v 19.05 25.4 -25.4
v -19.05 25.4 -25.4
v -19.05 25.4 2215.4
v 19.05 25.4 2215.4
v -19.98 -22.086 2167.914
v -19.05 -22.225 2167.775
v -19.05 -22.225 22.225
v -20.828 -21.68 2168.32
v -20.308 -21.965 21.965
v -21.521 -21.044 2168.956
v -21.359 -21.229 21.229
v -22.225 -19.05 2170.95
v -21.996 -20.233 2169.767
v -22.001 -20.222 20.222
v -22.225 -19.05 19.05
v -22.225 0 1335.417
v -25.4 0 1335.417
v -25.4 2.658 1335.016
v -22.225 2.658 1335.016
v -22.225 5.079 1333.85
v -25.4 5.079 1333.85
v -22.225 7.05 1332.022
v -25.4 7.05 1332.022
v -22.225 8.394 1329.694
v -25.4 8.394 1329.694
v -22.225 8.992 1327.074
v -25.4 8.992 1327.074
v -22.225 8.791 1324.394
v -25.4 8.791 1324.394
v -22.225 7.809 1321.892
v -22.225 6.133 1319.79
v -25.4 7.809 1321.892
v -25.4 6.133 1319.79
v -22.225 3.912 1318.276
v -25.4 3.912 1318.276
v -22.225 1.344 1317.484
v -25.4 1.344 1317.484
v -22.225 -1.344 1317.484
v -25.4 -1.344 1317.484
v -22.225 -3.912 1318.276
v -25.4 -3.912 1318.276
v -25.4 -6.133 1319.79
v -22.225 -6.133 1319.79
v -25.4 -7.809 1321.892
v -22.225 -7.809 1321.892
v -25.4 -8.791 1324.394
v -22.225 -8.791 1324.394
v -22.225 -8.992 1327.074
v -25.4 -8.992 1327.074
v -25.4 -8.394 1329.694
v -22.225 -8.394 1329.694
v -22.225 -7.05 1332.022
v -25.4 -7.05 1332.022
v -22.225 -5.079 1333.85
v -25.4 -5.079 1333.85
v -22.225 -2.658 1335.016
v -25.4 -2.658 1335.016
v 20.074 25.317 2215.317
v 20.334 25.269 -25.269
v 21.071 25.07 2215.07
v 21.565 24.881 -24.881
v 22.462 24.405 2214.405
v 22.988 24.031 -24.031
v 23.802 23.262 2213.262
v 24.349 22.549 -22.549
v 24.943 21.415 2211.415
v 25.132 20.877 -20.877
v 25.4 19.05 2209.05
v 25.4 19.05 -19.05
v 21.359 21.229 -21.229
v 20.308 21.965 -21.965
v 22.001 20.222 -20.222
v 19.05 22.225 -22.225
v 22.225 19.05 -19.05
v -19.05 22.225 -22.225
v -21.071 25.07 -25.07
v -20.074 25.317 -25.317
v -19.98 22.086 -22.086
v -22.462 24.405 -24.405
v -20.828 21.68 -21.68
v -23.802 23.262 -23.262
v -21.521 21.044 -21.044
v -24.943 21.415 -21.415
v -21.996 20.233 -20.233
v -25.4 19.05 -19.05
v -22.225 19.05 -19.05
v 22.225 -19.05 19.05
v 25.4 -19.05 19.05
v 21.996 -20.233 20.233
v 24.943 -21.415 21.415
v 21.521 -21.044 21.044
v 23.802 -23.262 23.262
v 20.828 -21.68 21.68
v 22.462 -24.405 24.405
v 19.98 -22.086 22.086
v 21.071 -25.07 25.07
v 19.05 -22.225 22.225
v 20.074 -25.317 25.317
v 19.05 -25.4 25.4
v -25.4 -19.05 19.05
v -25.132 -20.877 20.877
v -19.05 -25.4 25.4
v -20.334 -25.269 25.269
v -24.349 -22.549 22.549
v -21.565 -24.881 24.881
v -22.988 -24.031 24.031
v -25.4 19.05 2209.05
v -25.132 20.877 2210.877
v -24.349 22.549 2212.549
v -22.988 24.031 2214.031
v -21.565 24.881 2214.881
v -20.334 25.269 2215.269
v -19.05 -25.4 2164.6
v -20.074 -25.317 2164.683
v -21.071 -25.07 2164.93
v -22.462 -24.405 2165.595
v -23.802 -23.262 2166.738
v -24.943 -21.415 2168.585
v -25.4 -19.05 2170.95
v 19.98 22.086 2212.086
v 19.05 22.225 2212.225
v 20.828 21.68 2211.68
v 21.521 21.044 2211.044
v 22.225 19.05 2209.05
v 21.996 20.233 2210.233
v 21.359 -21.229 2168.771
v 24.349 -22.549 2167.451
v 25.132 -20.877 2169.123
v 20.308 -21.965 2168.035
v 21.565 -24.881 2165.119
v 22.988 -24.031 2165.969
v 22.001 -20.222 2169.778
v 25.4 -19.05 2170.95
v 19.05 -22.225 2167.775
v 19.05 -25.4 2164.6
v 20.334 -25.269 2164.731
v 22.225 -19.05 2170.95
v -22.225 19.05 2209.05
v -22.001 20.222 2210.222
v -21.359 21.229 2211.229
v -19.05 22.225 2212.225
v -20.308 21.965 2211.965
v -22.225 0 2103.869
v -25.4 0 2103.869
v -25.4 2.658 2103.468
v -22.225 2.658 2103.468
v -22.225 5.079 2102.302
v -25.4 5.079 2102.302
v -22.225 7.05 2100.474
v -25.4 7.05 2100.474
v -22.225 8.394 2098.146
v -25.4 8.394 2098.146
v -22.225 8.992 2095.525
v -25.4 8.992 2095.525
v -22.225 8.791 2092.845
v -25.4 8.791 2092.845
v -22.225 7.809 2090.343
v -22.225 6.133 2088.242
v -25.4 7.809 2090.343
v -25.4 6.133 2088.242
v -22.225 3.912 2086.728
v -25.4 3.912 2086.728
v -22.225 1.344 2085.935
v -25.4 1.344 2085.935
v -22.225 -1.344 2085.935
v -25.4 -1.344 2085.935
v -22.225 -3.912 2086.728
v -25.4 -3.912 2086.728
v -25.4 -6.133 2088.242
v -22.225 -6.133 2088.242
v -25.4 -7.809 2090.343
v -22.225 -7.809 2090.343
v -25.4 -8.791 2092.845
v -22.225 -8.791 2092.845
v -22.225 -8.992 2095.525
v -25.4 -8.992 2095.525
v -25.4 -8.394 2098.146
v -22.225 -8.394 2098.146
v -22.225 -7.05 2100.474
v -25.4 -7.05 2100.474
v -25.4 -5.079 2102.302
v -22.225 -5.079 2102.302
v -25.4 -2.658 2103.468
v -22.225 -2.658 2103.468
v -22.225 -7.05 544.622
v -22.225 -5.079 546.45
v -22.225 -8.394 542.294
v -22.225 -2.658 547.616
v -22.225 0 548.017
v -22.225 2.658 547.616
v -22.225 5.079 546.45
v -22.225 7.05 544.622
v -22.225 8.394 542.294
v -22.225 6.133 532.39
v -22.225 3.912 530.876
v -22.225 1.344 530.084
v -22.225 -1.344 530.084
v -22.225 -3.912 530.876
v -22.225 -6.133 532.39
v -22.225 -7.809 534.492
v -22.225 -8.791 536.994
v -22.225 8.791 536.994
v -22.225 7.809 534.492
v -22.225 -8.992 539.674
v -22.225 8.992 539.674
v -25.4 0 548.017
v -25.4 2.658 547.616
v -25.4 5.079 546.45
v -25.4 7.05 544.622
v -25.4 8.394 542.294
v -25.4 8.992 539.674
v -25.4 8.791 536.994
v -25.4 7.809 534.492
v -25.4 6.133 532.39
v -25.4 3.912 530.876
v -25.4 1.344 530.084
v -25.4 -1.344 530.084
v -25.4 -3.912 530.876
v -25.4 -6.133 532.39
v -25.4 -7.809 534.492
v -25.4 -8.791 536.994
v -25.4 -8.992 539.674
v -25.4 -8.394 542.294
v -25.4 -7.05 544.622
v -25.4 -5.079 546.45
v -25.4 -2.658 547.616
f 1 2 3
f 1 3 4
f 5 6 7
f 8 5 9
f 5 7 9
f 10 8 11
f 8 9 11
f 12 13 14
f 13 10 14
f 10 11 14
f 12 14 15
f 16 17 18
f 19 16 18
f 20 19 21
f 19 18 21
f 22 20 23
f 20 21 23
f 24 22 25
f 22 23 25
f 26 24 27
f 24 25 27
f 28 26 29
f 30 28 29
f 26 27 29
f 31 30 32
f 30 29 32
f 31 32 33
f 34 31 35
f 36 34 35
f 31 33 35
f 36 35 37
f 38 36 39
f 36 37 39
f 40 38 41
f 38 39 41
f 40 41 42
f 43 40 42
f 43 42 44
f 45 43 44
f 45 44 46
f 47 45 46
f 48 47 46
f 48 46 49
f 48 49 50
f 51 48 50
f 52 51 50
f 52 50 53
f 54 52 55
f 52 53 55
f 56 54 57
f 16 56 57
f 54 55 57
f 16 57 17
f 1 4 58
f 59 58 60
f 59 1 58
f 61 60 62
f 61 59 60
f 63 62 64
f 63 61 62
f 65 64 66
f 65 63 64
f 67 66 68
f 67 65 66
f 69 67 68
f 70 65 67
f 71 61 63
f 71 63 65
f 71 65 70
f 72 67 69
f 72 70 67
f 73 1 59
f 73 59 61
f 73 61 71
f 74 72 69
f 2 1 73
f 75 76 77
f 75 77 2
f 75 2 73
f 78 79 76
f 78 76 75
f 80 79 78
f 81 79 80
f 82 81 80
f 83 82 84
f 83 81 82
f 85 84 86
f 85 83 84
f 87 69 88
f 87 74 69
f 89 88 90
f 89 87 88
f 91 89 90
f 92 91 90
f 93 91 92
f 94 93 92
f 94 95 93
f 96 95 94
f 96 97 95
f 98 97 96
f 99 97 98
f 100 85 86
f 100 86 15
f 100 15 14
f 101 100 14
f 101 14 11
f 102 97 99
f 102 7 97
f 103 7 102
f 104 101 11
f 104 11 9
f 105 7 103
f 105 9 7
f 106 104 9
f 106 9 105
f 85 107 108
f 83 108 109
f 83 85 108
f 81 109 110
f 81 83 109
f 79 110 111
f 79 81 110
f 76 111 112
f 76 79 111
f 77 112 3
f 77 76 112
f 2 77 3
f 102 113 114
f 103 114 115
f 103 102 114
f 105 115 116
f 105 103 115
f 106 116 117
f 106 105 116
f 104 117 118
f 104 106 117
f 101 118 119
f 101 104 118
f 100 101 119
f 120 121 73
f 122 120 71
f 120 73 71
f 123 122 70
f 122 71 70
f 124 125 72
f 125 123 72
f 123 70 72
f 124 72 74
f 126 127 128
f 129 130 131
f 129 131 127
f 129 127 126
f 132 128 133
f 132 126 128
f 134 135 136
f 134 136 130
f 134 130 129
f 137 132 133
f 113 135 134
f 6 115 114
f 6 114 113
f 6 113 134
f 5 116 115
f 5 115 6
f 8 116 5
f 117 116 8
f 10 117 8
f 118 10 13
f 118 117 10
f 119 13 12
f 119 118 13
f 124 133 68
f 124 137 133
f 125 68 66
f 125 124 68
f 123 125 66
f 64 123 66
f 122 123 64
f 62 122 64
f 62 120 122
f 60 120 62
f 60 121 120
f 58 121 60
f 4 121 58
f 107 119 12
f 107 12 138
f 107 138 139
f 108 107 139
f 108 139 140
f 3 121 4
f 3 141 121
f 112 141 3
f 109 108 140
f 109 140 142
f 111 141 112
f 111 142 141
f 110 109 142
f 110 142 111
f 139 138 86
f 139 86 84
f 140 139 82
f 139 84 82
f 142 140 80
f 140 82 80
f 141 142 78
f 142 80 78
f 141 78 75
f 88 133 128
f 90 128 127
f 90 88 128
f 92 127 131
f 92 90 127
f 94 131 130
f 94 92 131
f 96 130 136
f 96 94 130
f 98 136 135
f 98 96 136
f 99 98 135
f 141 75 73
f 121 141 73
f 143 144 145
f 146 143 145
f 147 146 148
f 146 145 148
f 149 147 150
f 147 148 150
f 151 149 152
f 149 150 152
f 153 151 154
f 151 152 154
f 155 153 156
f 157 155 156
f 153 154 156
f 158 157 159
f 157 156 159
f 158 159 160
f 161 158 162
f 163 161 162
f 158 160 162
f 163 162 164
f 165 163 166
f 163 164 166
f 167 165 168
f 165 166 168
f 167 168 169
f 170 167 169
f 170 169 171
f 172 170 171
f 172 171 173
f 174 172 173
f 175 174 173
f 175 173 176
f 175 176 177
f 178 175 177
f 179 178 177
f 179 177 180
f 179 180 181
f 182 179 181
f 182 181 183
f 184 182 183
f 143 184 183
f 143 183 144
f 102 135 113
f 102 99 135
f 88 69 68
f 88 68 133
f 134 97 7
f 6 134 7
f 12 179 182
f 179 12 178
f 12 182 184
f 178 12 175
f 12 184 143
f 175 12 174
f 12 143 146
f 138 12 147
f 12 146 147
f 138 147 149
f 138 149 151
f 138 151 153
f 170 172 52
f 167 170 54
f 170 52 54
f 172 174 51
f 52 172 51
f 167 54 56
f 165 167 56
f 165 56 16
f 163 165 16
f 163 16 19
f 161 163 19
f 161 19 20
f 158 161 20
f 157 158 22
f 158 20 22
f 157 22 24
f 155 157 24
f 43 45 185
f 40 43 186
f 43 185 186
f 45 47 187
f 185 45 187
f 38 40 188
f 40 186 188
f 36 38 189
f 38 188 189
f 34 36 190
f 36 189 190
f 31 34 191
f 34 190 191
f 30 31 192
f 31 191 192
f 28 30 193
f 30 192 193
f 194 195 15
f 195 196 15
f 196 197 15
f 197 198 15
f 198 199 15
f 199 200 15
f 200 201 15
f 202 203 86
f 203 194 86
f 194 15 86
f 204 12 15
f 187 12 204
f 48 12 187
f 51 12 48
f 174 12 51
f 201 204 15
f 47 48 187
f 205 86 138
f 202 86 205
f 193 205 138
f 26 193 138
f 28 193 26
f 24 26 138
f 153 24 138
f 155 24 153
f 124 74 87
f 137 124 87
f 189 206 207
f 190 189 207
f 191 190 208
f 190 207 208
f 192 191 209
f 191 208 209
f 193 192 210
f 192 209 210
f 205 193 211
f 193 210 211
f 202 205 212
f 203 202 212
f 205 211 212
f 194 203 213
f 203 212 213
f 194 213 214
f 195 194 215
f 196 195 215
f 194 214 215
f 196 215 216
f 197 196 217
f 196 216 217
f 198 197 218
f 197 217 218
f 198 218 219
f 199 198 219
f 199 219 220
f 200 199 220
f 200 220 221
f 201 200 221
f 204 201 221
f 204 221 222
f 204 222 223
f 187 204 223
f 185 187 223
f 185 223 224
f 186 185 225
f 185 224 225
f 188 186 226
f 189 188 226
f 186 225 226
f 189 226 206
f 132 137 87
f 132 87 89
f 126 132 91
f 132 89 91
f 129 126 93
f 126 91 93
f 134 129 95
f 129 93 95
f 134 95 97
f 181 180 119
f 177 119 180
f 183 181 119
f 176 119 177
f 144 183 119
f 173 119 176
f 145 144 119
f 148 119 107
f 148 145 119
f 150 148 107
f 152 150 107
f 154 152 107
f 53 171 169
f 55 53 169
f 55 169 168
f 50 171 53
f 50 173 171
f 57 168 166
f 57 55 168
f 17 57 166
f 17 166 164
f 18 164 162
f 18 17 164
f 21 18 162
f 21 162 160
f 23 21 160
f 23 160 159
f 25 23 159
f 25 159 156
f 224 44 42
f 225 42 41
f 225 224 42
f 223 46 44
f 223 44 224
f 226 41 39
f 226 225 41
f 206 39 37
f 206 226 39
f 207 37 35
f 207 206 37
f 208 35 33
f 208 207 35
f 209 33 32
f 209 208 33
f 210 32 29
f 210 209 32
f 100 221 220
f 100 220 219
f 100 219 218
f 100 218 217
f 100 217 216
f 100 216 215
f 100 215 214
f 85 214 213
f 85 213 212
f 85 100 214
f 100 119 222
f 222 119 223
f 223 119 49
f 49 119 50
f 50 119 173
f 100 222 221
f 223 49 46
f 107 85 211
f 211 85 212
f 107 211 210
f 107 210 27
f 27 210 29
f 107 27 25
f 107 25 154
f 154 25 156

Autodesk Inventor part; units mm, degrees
ref_plane "Plano inicial" through (0, 0, -25.4) normal (0, 0, 1) x (1, 0, 0)
ref_plane "Plano final" through (0, 0, 2215.4) normal (0, 0, 1) x (1, 0, 0)
sketch "Boceto" plane through (0, 0, 0) normal (0, 0, 1) x (1, 0, 0)
  line L0 (-25.4, -19.05) -> (-25.4, 19.05)
  line L1 (-19.05, 25.4) -> (19.05, 25.4)
  line L2 (25.4, 19.05) -> (25.4, -19.05)
  line L3 (19.05, -25.4) -> (-19.05, -25.4)
  arc A0 (-25.4, -19.05) -> (-19.05, -25.4) centre (-19.05, -19.05) ccw
  arc A1 (-19.05, 25.4) -> (-25.4, 19.05) centre (-19.05, 19.05) ccw
  arc A2 (25.4, 19.05) -> (19.05, 25.4) centre (19.05, 19.05) ccw
  arc A3 (19.05, -25.4) -> (25.4, -19.05) centre (19.05, -19.05) ccw
  arc A4 (-19.05, 22.225) -> (-22.225, 19.05) centre (-19.05, 19.05) ccw
  line L4 (-19.05, 22.225) -> (19.05, 22.225)
  arc A5 (22.225, 19.05) -> (19.05, 22.225) centre (19.05, 19.05) ccw
  line L5 (22.225, 19.05) -> (22.225, -19.05)
  arc A6 (19.05, -22.225) -> (22.225, -19.05) centre (19.05, -19.05) ccw
  line L6 (19.05, -22.225) -> (-19.05, -22.225)
  arc A7 (-22.225, -19.05) -> (-19.05, -22.225) centre (-19.05, -19.05) ccw
  line L7 (-22.225, -19.05) -> (-22.225, 19.05)
  line L8 (0, 37.4012) -> (0, -37.4012) construction
  line L9 (-37.4012, 0) -> (37.4012, 0) construction
  dimension "d10" = 50.8
  dimension "d11" = 50.8
  dimension "d12" = 3.175
  dimension "d15" = 25.4
  dimension "d16" = 25.4
  dimension "d17" = 6.35
extrude "Cuerpo" add sketch "Boceto" along normal up to surface (2240.8 mm away) from surface at -25.4
sketch "Sketch3" plane through (0, 0, 0) normal (0, 0, 1) x (1, 0, 0)
  line L0 (0, 0) -> (10, 0)
ref_plane "Work Plane3" through (0, 0, 0) normal (0, -1, 0) x (1, 0, 0)
ref_plane "Plano de trabajo4" through (0, 25.4, 2215.4) normal (0, -0.7071, 0.7071) x (1, 0, 0)
split "Dividir1" plane through (0, 25.4, 2215.4) removes the side toward (0, -0.7071, 0.7071)
ref_plane "Plano de trabajo5" through (0, 25.4, -25.4) normal (0, -0.7071, -0.7071) x (1, 0, 0)
split "Dividir2" plane through (0, 25.4, -25.4) removes the side toward (0, -0.7071, -0.7071)
sketch "Boceto5" plane through (-25.4, 19.05, -19.05) normal (-1, 0, 0) x (0, 0, 1)
  line L0 (19.05, -19.05) -> (2209.05, -19.05)
  line L1 (2228.1, 0) -> (2190, -38.1) projected
  circle A0 centre (2113.9016, -19.05) radius 9.017
  circle A1 centre (1345.45, -19.05) radius 9.017
  circle A2 centre (558.05, -19.05) radius 9.017
  line L2 (2190, -38.1) -> (2228.1, 0) projected
  dimension "d20" = 18.034
  dimension "d21" = 18.034
  dimension "d22" = 18.034
  dimension "d23" = 1651
  dimension "d24" = 863.6
  dimension "d25" = 95.1484
extrude "Extrusión2" cut sketch "Boceto5" against normal blind 12.7
sketch "Sketch4" plane through (0, 0, 0) normal (0, -1, 0) x (1, 0, 0)
  line L0 (-2, -25.4) -> (12, -25.4) projected
  line L1 (-2, 2215.4) -> (12, 2215.4) projected
  dimension "d19" = 2240.8
equation "\"d10\" = G_H"
equation "\"d11\" = G_W"
equation "\"d12\" = G_T"
equation "\"d15\" = 0.5 * d10"
equation "\"d16\" = 0.5 * d11"
equation "\"d17\" = G_IR"
equation "\"d3\" = G_L"
equation "\"G_W\" = 50.8"
equation "\"G_H\" = 50.8"
equation "\"G_T\" = 3.175"
equation "\"G_IR\" = 6.35"
equation "\"G_L\" = d19"
equation "\"G_OFFSET_START\" = 25.4"
equation "\"G_OFFSET_END\" = 25.4"
equation "\"d13\" = -G_OFFSET_START"
equation "\"d14\" = G_OFFSET_END + B_L"
equation "\"B_L\" = 2190"
properties part number "AISC - 2 x 2 x 1/8 - 88,22" material "Acero, suave"
